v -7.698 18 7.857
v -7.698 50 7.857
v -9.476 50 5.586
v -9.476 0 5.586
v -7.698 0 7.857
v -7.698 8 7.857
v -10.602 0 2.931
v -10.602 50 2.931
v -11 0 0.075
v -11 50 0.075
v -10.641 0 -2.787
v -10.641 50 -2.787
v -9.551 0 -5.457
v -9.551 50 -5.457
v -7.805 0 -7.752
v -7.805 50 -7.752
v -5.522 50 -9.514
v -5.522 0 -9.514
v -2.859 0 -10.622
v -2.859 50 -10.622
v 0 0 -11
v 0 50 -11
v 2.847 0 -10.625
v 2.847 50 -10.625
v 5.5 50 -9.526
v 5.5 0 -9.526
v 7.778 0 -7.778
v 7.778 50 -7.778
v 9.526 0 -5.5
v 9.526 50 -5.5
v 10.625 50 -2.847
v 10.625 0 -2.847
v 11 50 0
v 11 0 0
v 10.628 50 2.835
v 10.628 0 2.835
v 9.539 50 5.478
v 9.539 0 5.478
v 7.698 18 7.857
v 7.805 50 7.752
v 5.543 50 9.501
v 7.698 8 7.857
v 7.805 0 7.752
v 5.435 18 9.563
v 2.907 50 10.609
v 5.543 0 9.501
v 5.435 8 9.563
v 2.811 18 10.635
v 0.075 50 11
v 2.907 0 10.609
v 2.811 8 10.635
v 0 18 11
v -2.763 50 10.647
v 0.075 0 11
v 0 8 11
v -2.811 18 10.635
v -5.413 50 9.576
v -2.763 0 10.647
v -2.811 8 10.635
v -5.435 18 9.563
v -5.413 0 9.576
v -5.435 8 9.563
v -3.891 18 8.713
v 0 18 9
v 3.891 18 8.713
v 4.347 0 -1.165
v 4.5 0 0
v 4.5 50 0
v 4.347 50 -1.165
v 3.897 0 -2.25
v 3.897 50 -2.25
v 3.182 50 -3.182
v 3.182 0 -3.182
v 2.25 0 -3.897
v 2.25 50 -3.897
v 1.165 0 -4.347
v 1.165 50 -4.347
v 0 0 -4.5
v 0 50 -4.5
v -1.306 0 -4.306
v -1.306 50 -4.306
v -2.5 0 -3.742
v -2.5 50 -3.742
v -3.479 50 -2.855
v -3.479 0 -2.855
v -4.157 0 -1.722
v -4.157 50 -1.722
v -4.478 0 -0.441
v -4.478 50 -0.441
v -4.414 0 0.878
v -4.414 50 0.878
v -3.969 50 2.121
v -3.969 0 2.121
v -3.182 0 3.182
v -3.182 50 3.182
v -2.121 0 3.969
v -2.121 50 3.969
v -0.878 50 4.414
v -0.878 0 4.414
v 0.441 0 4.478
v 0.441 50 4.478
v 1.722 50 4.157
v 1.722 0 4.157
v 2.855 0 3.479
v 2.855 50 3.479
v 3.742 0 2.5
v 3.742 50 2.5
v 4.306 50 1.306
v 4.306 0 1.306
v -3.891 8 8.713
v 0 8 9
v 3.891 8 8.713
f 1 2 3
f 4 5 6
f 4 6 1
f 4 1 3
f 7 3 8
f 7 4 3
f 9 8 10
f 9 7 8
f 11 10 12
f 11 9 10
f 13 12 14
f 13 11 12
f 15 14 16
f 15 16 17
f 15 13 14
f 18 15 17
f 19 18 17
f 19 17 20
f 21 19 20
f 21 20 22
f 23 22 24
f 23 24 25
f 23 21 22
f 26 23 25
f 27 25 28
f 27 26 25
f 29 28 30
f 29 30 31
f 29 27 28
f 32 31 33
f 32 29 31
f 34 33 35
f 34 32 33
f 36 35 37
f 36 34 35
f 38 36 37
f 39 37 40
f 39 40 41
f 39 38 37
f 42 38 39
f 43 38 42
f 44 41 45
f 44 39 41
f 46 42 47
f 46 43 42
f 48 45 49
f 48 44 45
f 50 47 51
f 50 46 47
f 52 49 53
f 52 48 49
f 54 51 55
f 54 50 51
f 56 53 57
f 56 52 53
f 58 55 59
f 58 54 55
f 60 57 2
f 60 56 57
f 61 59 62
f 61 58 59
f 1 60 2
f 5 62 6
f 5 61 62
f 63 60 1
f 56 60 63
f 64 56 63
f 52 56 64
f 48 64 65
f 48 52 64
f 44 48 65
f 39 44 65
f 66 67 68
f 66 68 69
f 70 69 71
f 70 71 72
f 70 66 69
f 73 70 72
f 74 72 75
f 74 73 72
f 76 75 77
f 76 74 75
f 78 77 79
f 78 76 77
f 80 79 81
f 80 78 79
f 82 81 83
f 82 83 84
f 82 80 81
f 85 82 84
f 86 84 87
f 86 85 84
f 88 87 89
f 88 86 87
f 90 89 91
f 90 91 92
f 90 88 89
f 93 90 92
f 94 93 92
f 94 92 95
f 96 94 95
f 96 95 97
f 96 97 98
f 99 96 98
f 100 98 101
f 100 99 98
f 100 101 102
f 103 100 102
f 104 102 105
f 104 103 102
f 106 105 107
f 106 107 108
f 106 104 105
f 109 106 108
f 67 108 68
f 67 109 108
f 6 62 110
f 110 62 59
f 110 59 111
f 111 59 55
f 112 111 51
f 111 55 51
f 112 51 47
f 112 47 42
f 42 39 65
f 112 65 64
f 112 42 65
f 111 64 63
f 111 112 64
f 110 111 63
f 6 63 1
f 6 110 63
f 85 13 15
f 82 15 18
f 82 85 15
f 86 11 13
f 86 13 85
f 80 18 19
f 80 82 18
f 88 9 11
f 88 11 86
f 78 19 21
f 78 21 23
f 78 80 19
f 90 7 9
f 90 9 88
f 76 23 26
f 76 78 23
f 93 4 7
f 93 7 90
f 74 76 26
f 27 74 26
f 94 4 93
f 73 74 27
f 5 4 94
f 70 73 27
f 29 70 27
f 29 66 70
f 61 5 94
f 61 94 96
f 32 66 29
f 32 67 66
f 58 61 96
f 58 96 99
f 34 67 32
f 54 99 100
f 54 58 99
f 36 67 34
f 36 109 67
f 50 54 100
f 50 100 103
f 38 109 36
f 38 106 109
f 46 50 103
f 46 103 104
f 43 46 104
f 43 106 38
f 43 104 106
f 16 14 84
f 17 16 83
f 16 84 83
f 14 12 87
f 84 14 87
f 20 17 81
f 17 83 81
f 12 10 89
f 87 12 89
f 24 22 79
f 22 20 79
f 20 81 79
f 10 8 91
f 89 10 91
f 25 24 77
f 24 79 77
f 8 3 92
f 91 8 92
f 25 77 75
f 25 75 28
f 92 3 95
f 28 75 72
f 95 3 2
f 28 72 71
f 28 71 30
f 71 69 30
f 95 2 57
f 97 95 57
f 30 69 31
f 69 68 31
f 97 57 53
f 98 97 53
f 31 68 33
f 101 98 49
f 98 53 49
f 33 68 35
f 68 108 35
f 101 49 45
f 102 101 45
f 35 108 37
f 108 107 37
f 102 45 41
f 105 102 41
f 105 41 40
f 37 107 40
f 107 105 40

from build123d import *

# Parameters (mm, degrees)
F1_DEPTH = 8
F2_DEPTH = 18
F3_START = -18
F3_DEPTH = 32


with BuildPart() as f1:
    # F0 (on Front) → F1 (new body)
    with BuildSketch(Plane.XZ):
        with BuildLine():
            ThreePointArc((0, -11), (7.7781745931, -7.7781745931), (11, 0))
            ThreePointArc((11, 0), (10.1410640388, 4.2613167168), (7.6983963345, 7.8571428571))
            ThreePointArc((7.6983963345, 7.8571428571), (0, 9), (-7.6983963345, 7.8571428571))
            ThreePointArc((-7.6983963345, 7.8571428571), (-10.1840210975, -4.1576092031), (0, -11))
        make_face()
        with BuildLine():
            ThreePointArc((4.5, 0), (3.1819805153, -3.1819805153), (0, -4.5))
            ThreePointArc((0, -4.5), (-3.1819805153, 3.1819805153), (4.5, 0))
        make_face(mode=Mode.SUBTRACT)
        with BuildLine():
            ThreePointArc((-7.6983963345, 7.8571428571), (0, 9), (7.6983963345, 7.8571428571))
            ThreePointArc((7.6983963345, 7.8571428571), (0, 11), (-7.6983963345, 7.8571428571))
        make_face()
    extrude(amount=-F1_DEPTH)

    # F0 (on Front) → F2 (join)
    with BuildSketch(Plane.XZ):
        with BuildLine():
            ThreePointArc((0, -11), (7.7781745931, -7.7781745931), (11, 0))
            ThreePointArc((11, 0), (10.1410640388, 4.2613167168), (7.6983963345, 7.8571428571))
            ThreePointArc((7.6983963345, 7.8571428571), (0, 9), (-7.6983963345, 7.8571428571))
            ThreePointArc((-7.6983963345, 7.8571428571), (-10.1840210975, -4.1576092031), (0, -11))
        make_face()
        with BuildLine():
            ThreePointArc((4.5, 0), (3.1819805153, -3.1819805153), (0, -4.5))
            ThreePointArc((0, -4.5), (-3.1819805153, 3.1819805153), (4.5, 0))
        make_face(mode=Mode.SUBTRACT)
    extrude(amount=-F2_DEPTH)

    # F0 (on Front) → F3 (join)
    with BuildSketch(Plane.XZ.offset(F3_START)):
        with BuildLine():
            ThreePointArc((0, -11), (7.7781745931, -7.7781745931), (11, 0))
            ThreePointArc((11, 0), (10.1410640388, 4.2613167168), (7.6983963345, 7.8571428571))
            ThreePointArc((7.6983963345, 7.8571428571), (0, 9), (-7.6983963345, 7.8571428571))
            ThreePointArc((-7.6983963345, 7.8571428571), (-10.1840210975, -4.1576092031), (0, -11))
        make_face()
        with BuildLine():
            ThreePointArc((4.5, 0), (3.1819805153, -3.1819805153), (0, -4.5))
            ThreePointArc((0, -4.5), (-3.1819805153, 3.1819805153), (4.5, 0))
        make_face(mode=Mode.SUBTRACT)
        with BuildLine():
            ThreePointArc((-7.6983963345, 7.8571428571), (0, 9), (7.6983963345, 7.8571428571))
            ThreePointArc((7.6983963345, 7.8571428571), (0, 11), (-7.6983963345, 7.8571428571))
        make_face()
    extrude(amount=-F3_DEPTH)


solid = f1.part
